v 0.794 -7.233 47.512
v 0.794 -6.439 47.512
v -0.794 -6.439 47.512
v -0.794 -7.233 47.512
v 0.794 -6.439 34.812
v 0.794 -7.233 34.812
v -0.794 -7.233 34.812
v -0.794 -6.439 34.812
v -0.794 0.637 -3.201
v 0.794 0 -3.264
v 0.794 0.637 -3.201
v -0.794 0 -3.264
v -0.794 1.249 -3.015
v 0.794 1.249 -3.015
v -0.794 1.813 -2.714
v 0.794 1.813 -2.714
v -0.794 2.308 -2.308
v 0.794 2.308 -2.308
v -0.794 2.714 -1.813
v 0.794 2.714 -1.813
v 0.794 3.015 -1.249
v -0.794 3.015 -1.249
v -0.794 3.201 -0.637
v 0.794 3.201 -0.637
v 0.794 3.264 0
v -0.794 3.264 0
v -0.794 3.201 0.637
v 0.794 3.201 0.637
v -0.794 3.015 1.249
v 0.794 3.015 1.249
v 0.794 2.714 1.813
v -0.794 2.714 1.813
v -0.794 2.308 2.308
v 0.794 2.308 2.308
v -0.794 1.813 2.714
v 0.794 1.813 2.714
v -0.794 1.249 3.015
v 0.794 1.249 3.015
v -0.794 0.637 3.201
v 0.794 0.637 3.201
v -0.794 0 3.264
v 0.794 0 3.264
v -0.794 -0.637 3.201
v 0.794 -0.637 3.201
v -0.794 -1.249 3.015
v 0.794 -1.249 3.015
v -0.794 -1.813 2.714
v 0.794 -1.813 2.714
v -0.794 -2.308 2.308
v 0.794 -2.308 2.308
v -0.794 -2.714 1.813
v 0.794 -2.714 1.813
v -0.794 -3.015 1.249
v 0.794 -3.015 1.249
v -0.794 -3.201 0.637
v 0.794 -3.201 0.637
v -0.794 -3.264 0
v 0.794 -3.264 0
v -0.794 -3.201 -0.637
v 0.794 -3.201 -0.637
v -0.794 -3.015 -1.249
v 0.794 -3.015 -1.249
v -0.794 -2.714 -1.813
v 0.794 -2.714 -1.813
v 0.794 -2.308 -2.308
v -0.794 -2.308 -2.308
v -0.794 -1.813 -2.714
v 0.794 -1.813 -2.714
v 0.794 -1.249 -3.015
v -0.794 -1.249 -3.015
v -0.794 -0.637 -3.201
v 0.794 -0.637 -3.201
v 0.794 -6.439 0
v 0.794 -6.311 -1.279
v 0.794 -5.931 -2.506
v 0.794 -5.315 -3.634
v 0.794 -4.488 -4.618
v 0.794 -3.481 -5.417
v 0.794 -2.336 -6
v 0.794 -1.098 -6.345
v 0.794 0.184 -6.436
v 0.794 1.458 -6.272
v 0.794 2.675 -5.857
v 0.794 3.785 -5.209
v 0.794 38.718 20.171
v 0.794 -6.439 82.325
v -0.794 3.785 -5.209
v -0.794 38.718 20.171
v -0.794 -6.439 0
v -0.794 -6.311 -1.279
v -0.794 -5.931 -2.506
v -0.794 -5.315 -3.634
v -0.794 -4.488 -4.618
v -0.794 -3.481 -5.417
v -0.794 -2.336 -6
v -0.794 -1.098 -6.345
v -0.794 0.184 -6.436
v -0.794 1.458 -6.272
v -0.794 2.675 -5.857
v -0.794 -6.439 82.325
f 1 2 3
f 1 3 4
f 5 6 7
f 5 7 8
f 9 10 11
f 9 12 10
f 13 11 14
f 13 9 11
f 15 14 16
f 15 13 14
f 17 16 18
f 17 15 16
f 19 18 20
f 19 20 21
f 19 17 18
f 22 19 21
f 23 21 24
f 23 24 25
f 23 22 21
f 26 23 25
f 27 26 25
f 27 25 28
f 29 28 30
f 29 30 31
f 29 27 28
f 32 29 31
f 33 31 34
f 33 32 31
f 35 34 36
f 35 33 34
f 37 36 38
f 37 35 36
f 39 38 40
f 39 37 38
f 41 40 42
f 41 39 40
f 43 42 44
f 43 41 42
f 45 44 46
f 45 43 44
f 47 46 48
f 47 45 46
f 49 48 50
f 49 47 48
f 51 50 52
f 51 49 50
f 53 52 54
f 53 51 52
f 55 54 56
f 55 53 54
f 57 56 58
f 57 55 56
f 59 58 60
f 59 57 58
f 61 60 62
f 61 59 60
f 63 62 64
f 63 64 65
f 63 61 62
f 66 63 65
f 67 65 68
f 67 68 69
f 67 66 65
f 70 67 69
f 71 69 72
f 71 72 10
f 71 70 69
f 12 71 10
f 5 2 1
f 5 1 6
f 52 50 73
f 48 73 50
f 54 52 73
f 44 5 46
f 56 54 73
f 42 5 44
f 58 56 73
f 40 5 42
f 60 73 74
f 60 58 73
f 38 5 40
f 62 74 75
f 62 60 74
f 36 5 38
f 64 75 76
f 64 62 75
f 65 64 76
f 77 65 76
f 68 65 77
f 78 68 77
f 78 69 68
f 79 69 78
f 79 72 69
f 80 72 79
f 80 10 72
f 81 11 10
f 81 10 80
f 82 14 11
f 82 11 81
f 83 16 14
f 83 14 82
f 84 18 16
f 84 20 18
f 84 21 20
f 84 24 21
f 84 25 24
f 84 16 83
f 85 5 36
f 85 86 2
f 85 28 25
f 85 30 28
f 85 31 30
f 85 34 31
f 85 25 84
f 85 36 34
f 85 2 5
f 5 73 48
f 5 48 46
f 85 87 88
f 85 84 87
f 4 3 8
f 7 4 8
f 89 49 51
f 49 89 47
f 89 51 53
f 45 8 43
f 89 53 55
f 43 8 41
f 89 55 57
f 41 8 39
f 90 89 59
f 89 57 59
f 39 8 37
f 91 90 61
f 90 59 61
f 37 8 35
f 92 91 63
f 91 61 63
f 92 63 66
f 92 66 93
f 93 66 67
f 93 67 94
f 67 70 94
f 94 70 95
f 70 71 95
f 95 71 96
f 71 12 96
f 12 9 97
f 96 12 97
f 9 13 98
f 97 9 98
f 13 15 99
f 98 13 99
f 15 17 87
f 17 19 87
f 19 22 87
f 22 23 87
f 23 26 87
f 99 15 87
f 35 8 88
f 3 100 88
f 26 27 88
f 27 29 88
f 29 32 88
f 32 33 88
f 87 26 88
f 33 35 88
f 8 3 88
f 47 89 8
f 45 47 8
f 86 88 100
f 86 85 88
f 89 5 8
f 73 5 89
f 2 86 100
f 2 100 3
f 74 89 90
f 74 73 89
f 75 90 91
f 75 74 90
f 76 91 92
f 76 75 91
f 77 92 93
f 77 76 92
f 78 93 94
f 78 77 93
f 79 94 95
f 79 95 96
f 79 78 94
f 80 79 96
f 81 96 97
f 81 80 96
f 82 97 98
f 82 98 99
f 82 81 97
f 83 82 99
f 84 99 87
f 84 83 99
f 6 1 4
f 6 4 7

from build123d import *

# Parameters (mm, degrees)
SKETCH1_R           = 3.2639
BOSS_EXTRUDE1_DEPTH = 0.79375


with BuildPart() as part:
    # Sketch1 → Boss-Extrude1 (new, symmetric)
    with BuildSketch(Plane(origin=(0, 0, 0), x_dir=(0, 0, -1), z_dir=(1, 0, 0))):
        with BuildLine():
            Line((-20.171387669, 38.718044278), (-82.324589357, -6.4389))
            Line((-82.324589357, -6.4389), (-47.512294679, -6.4389))
            Line((-47.512294679, -6.4389), (-47.512294679, -7.23265))
            Line((-47.512294679, -7.23265), (-34.812294679, -7.23265))
            Line((-34.812294679, -7.23265), (-34.812294679, -6.4389))
            Line((-34.812294679, -6.4389), (0, -6.4389))
            ThreePointArc((0, -6.4389), (5.737101909, -2.923199429), (5.209179525, 3.784690461))
            Line((5.209179525, 3.784690461), (-20.171387669, 38.718044278))
        make_face()
        Circle(SKETCH1_R, mode=Mode.SUBTRACT)
    extrude(amount=BOSS_EXTRUDE1_DEPTH, both=True)


solid = part.part
